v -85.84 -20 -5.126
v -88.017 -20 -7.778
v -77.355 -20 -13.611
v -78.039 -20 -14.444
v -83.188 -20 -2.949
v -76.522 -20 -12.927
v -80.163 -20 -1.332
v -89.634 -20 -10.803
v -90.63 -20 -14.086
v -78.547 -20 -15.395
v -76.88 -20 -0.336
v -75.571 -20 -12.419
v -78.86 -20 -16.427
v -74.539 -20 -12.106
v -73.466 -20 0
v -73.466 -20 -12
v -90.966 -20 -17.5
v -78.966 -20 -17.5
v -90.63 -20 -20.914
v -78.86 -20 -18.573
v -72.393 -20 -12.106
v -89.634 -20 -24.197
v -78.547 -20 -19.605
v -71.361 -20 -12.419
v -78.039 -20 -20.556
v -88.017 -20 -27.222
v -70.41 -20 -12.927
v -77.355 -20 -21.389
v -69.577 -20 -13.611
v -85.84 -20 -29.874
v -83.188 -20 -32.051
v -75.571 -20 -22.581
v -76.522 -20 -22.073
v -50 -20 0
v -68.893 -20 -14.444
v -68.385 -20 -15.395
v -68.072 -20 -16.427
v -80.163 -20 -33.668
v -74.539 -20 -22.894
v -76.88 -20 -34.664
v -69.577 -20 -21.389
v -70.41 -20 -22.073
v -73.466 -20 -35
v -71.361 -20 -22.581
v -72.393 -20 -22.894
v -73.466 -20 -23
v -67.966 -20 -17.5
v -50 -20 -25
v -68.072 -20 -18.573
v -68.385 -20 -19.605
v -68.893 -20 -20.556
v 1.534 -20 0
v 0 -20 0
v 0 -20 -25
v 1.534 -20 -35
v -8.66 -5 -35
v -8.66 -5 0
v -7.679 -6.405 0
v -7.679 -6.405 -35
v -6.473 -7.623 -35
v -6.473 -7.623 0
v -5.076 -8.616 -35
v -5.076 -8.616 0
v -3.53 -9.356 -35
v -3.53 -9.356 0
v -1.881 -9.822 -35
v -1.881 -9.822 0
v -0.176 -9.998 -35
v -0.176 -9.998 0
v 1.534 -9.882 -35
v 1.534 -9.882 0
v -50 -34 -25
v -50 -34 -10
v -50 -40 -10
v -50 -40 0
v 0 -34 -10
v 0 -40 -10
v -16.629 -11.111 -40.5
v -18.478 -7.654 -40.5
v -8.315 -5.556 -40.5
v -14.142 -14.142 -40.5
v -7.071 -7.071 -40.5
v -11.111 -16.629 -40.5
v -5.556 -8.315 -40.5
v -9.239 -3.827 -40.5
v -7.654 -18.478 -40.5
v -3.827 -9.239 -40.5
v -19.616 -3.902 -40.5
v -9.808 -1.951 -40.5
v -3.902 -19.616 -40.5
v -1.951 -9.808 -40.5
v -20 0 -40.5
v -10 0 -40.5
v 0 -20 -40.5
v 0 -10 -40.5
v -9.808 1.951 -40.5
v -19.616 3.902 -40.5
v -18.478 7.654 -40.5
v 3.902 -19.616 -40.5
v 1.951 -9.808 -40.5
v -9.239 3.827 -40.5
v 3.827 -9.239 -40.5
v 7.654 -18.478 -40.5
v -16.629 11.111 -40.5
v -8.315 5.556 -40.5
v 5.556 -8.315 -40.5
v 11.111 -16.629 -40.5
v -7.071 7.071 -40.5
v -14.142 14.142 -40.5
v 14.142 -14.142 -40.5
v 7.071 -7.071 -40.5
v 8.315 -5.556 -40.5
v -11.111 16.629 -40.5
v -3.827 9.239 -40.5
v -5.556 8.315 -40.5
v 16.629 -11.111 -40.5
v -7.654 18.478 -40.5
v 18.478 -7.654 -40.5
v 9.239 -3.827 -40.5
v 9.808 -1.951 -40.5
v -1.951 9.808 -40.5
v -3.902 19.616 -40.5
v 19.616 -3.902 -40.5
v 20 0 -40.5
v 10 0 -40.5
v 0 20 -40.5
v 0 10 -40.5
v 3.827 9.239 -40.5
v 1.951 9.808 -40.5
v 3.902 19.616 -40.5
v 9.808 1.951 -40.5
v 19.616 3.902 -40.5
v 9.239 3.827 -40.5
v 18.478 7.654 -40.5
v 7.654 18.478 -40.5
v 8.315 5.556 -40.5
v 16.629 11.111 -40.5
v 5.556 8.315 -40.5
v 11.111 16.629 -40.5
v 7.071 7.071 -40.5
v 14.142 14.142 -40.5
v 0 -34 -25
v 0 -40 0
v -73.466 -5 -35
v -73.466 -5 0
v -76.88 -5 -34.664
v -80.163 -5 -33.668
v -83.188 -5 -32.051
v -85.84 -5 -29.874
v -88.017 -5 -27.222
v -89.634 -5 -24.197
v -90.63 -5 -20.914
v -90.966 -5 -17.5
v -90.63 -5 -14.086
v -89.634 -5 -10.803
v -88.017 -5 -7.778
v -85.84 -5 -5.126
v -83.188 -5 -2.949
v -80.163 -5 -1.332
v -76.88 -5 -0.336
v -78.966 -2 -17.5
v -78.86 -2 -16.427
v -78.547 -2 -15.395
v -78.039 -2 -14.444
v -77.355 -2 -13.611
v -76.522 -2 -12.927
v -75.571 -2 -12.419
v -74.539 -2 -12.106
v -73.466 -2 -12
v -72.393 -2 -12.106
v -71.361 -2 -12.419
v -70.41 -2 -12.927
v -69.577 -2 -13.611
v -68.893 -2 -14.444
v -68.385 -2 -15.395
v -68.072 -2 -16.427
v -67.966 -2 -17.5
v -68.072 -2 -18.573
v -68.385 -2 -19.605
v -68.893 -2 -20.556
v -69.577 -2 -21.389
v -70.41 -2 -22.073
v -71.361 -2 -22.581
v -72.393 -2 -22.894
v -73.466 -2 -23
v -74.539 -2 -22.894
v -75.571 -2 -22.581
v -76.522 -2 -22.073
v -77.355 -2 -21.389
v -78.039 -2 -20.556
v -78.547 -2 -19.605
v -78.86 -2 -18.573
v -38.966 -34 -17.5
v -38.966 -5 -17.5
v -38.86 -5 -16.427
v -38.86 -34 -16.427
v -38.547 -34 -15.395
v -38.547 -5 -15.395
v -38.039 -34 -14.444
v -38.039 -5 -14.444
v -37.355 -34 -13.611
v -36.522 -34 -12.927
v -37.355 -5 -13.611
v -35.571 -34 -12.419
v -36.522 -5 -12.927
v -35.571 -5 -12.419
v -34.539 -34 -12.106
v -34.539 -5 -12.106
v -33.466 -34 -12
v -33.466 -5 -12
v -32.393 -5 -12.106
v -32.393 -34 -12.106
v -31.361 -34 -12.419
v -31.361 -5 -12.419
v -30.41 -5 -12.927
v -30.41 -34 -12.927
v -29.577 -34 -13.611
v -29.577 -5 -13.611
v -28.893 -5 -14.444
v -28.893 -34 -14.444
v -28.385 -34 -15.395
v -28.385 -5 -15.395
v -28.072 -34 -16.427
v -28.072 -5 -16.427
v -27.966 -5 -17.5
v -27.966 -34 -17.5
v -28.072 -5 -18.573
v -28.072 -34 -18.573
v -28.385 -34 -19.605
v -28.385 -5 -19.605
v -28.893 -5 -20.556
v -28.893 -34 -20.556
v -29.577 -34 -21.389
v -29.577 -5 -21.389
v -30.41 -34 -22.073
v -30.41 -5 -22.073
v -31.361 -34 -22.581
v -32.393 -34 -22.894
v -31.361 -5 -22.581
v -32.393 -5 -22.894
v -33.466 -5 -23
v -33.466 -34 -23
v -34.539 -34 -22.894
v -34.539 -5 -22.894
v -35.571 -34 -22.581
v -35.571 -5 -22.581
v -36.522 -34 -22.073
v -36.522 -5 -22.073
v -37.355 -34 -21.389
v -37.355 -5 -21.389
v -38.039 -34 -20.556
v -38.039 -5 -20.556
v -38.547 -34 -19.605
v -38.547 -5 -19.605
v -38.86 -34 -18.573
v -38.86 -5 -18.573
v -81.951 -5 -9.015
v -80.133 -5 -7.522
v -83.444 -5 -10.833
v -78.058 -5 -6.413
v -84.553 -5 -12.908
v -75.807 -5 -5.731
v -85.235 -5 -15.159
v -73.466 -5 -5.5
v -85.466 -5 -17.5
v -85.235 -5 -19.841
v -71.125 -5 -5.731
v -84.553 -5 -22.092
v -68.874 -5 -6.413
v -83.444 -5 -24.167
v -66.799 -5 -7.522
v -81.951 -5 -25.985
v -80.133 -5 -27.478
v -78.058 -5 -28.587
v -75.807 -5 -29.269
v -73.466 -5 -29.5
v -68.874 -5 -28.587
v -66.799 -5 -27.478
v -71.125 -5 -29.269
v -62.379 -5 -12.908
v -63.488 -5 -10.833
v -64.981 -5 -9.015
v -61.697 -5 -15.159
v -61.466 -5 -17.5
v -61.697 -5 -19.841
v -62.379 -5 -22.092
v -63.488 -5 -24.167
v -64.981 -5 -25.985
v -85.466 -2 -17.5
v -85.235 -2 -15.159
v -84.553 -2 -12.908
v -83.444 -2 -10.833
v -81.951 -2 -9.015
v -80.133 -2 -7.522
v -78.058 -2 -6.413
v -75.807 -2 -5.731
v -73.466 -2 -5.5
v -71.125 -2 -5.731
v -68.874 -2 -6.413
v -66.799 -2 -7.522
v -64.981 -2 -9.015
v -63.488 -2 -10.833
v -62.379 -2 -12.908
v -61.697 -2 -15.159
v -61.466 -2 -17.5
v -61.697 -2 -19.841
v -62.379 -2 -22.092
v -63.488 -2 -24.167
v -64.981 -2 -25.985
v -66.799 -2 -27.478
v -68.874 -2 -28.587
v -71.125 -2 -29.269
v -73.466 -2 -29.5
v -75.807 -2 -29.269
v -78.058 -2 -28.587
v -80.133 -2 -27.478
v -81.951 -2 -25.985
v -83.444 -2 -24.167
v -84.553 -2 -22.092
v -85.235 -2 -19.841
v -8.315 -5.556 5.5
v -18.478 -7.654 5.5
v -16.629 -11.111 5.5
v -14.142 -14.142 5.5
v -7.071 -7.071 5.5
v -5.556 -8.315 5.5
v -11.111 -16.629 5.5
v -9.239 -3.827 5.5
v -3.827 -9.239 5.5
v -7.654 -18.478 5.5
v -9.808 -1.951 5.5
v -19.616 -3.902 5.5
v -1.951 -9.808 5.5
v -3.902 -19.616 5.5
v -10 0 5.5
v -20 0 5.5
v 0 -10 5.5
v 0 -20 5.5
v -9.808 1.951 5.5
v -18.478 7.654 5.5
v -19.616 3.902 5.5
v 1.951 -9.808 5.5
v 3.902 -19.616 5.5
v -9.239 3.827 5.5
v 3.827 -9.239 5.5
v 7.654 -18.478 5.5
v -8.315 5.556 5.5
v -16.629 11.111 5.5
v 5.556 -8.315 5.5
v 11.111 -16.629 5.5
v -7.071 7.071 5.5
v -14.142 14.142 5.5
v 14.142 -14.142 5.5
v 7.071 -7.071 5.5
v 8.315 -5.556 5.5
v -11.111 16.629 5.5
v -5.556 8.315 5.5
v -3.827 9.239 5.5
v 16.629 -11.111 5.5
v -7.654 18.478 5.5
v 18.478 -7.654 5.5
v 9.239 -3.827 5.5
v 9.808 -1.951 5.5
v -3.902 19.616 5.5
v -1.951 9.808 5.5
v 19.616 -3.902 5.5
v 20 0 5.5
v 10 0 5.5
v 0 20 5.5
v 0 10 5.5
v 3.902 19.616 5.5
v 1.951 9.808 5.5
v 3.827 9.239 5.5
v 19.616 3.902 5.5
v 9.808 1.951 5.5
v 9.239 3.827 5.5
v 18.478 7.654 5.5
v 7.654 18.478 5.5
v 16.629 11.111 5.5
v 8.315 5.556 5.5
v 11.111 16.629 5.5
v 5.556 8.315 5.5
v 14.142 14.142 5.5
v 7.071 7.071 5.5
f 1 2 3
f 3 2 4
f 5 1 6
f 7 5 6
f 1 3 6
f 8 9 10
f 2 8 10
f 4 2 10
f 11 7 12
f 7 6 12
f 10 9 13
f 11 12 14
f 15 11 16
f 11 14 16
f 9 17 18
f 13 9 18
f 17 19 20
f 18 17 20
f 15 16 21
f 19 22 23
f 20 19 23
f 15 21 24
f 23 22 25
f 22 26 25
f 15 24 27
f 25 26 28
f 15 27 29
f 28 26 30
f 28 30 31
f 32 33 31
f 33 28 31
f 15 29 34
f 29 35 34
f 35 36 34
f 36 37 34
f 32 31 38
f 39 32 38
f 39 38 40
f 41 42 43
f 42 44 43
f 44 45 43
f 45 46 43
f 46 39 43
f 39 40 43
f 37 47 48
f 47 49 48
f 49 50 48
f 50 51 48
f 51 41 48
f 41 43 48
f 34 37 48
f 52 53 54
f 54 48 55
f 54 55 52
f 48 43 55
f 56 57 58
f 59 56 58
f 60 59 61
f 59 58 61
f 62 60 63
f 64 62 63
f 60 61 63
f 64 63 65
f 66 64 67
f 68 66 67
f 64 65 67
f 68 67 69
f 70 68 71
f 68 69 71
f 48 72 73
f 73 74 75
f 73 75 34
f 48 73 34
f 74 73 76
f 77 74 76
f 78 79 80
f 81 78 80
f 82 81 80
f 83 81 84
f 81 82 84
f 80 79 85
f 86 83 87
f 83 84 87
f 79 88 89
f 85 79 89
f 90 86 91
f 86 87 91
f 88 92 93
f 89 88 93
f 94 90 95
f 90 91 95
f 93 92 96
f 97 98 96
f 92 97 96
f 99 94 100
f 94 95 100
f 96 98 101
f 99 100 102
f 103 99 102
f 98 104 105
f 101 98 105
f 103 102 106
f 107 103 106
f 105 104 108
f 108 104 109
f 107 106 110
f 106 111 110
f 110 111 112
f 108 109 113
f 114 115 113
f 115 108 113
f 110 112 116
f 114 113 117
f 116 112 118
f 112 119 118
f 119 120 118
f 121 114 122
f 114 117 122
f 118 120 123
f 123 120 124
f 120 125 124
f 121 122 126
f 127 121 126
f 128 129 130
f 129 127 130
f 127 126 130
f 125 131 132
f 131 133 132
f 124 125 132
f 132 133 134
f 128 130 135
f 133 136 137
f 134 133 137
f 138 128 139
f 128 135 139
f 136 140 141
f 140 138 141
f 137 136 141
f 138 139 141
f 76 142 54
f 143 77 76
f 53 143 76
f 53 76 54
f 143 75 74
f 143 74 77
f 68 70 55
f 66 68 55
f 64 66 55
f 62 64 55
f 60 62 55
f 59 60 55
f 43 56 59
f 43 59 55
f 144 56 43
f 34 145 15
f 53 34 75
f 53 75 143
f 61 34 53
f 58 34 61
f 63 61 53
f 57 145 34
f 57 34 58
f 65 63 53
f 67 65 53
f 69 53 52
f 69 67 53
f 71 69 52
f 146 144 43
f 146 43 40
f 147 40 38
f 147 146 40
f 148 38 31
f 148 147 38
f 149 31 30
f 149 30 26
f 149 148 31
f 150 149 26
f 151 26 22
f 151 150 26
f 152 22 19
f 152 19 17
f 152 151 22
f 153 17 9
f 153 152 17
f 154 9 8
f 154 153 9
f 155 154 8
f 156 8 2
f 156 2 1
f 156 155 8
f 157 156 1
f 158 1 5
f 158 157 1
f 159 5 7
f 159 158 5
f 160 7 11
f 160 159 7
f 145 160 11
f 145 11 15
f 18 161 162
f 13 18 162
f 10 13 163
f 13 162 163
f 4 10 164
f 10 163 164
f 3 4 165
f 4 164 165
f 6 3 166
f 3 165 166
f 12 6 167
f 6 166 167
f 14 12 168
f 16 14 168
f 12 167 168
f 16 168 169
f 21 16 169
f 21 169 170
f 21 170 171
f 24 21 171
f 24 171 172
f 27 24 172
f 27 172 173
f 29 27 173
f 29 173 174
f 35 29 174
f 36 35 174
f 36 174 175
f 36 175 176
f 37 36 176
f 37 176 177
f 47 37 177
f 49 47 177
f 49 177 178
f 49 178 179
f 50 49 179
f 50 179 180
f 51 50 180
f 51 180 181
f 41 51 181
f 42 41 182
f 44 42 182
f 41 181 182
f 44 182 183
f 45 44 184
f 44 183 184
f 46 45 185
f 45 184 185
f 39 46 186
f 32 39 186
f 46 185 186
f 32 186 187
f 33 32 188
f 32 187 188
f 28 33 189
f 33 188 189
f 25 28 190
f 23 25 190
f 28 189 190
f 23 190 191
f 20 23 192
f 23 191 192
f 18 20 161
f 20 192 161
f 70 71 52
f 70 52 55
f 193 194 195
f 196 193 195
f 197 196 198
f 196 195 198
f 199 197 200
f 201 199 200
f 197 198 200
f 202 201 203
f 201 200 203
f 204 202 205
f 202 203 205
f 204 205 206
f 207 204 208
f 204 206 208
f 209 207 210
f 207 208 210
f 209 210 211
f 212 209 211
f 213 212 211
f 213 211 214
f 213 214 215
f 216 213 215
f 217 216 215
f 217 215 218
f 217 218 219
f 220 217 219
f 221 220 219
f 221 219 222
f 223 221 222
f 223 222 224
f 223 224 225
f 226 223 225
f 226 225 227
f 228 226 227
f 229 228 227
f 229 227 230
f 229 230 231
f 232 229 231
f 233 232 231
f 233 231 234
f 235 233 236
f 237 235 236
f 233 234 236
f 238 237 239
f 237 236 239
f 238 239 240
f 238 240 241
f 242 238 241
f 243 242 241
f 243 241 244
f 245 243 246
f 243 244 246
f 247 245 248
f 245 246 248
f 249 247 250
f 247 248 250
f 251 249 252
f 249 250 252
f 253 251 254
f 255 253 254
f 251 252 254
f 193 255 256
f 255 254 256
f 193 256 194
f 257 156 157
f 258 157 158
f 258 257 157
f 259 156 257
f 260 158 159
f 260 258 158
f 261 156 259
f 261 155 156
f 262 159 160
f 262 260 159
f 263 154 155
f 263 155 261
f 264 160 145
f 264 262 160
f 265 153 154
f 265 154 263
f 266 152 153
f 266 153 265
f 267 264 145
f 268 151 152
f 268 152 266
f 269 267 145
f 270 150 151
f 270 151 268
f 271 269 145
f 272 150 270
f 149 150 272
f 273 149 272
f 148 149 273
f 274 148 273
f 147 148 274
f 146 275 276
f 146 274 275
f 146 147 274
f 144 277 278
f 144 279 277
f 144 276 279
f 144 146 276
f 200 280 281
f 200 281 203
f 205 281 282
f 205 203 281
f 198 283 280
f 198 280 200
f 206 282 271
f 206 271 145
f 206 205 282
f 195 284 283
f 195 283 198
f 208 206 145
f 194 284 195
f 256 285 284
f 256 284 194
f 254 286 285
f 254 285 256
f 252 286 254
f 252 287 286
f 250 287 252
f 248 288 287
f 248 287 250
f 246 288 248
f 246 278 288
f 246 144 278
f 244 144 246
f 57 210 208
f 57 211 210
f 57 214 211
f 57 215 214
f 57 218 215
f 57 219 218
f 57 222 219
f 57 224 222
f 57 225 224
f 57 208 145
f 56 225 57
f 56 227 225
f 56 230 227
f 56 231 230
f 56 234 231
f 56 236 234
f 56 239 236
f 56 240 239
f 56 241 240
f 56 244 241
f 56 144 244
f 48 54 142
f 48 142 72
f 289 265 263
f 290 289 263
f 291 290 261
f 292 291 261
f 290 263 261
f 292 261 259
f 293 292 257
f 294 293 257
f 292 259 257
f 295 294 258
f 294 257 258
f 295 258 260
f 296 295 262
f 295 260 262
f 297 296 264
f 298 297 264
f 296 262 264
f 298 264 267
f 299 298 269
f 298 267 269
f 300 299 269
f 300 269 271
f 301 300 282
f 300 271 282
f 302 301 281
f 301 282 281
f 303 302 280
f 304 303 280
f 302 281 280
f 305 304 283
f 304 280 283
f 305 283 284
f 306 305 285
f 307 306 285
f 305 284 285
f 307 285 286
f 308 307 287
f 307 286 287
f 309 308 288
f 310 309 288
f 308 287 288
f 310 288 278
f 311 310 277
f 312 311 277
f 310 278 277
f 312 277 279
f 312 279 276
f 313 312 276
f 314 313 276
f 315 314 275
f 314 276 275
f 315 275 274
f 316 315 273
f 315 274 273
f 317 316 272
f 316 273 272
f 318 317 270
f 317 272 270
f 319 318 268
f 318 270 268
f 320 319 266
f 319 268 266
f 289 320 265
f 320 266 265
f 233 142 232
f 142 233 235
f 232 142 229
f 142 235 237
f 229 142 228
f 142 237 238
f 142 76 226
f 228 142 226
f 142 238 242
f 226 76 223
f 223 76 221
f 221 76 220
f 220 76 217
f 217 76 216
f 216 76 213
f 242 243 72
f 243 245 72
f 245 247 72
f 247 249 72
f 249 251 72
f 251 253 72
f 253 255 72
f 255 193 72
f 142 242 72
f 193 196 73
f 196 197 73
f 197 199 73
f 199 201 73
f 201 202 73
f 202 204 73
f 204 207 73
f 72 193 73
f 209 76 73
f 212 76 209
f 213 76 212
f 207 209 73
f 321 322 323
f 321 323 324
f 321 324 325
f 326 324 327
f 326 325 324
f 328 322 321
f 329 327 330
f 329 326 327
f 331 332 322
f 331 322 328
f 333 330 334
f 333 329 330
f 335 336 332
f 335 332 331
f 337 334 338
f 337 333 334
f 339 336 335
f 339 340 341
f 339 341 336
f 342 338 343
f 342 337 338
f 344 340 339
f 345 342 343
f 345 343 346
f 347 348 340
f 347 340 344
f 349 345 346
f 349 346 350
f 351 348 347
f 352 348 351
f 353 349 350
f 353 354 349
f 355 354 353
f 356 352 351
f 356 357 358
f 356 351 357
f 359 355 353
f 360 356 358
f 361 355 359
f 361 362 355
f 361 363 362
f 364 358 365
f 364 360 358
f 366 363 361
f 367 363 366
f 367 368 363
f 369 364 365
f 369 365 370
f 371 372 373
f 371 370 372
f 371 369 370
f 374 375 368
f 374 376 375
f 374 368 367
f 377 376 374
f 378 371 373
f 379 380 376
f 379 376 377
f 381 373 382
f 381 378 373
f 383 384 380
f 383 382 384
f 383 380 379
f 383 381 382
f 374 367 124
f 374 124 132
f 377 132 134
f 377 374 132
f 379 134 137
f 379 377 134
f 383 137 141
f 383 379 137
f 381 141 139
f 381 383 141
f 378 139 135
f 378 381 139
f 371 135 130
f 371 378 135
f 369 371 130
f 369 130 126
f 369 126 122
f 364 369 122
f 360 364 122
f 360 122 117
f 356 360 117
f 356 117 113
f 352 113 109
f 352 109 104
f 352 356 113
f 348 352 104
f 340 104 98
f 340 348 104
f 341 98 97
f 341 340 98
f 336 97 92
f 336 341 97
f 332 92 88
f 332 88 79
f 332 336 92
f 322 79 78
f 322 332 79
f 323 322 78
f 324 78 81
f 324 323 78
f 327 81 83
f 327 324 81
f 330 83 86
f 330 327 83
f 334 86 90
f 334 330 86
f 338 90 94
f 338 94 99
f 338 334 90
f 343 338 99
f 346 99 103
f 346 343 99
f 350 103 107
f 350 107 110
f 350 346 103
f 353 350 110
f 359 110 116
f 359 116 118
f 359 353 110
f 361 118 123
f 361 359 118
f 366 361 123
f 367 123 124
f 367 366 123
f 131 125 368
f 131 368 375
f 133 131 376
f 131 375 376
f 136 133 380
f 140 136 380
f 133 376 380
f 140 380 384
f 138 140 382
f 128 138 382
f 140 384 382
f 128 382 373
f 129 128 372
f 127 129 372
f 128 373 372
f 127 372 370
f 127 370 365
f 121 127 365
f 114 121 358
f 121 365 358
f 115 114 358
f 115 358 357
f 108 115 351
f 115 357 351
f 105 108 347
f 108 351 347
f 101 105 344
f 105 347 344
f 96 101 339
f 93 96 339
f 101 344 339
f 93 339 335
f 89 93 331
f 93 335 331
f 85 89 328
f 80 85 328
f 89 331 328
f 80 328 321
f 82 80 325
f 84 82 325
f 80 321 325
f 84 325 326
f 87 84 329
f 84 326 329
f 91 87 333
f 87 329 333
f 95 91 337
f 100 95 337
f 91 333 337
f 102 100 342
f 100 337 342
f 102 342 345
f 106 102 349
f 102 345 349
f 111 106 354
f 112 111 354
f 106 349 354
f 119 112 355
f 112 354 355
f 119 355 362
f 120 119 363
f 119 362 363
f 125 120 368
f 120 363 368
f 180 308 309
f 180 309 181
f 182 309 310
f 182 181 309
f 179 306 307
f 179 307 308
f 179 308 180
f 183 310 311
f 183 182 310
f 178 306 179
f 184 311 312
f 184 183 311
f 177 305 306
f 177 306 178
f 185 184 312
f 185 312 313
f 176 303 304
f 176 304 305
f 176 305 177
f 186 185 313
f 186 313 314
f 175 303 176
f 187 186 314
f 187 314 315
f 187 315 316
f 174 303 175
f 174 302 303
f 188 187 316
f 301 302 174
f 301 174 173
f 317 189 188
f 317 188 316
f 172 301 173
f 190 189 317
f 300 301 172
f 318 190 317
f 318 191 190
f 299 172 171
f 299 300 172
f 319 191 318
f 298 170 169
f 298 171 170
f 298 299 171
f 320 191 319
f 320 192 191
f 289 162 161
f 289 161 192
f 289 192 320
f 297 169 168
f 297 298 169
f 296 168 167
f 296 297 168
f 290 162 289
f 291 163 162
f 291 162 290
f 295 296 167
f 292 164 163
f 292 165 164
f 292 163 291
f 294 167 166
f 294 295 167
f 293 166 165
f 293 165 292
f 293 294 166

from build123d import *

# Parameters (mm, degrees)
IZIM2_W                     = 50
IZIM2_H                     = 20
Y_KSEKLIK_EKSTR_ZYON1_DEPTH = 10
IZIM5_W                     = 50
IZIM5_H                     = 14
Y_KSEKLIK_EKSTR_ZYON2_DEPTH = 15
IZIM9_R                     = 20
IZIM9_R_2                   = 10
Y_KSEKLIK_EKSTR_ZYON3_DEPTH = 46
Y_KSEKLIK_EKSTR_ZYON4_DEPTH = 15
IZIM10_R                    = 10
KES_EKSTR_ZYON1_DEPTH       = 62
IZIM11_R                    = 12
Y_KSEKLIK_EKSTR_ZYON5_DEPTH = 3
IZIM12_R                    = 5.5
KES_EKSTR_ZYON2_DEPTH       = 33
IZIM13_R                    = 5.5
KES_EKSTR_ZYON3_DEPTH       = 33


with BuildPart() as part:
    # Çizim2 → Yükseklik-Ekstrüzyon1 (new body)
    with BuildSketch(Plane.XY):
        with Locations((-25, -30)):
            Rectangle(IZIM2_W, IZIM2_H)
    extrude(amount=-Y_KSEKLIK_EKSTR_ZYON1_DEPTH)

    # Çizim5 → Yükseklik-Ekstrüzyon2 (add)
    with BuildSketch(Plane(origin=(0, 0, -10), x_dir=(-1, 0, 0), z_dir=(0, 0, -1))):
        with Locations((25, -27)):
            Rectangle(IZIM5_W, IZIM5_H)
    extrude(amount=Y_KSEKLIK_EKSTR_ZYON2_DEPTH)

    # Çizim7 → Yükseklik-Ekstrüzyon4 (add)
    with BuildSketch(Plane(origin=(0, -5, 0), x_dir=(1, 0, 0), z_dir=(0, 1, 0))):
        with BuildLine():
            Line((-73.466007096, 0), (-20, 0))
            Line((-20, 0), (-15.953746438, 0))
            Line((-15.953746438, 0), (1.533992904, 0))
            Line((1.533992904, 0), (1.533992904, 35))
            Line((1.533992904, 35), (-15.953746438, 35))
            Line((-15.953746438, 35), (-20, 35))
            Line((-20, 35), (-73.466007096, 35))
            ThreePointArc((-73.466007096, 35), (-90.966007096, 17.5), (-73.466007096, 0))
        make_face()
    extrude(amount=-Y_KSEKLIK_EKSTR_ZYON4_DEPTH)

    # Çizim10 → Kes-Ekstrüzyon1 (cut)
    with BuildSketch(Plane.XY.offset(5.5)):
        Circle(IZIM10_R)
    extrude(amount=-KES_EKSTR_ZYON1_DEPTH, mode=Mode.SUBTRACT)

    # Çizim11 → Yükseklik-Ekstrüzyon5 (add)
    with BuildSketch(Plane(origin=(0, -5, 0), x_dir=(1, 0, 0), z_dir=(0, 1, 0))):
        with Locations(Location((-73.466007096, 17.5, 0), (0, 0, 180))):
            Circle(IZIM11_R)
    extrude(amount=Y_KSEKLIK_EKSTR_ZYON5_DEPTH)

    # Çizim12 → Kes-Ekstrüzyon2 (cut)
    with BuildSketch(Plane(origin=(0, -2, 0), x_dir=(1, 0, 0), z_dir=(0, 1, 0))):
        with Locations(Location((-73.466007096, 17.5, 0), (0, 0, 180))):
            Circle(IZIM12_R)
    extrude(amount=-KES_EKSTR_ZYON2_DEPTH, mode=Mode.SUBTRACT)

    # Çizim13 → Kes-Ekstrüzyon3 (cut)
    with BuildSketch(Plane(origin=(0, -5, 0), x_dir=(1, 0, 0), z_dir=(0, 1, 0))):
        with Locations(Location((-33.466007096, 17.5, 0), (0, 0, 180))):
            Circle(IZIM13_R)
    extrude(amount=-KES_EKSTR_ZYON3_DEPTH, mode=Mode.SUBTRACT)


with BuildPart() as body_2:
    # Çizim9 → Yükseklik-Ekstrüzyon3 (new body)
    with BuildSketch(Plane.XY.offset(5.5)):
        Circle(IZIM9_R)
        Circle(IZIM9_R_2, mode=Mode.SUBTRACT)
    extrude(amount=-Y_KSEKLIK_EKSTR_ZYON3_DEPTH)


solid = Compound([part.part, body_2.part])
